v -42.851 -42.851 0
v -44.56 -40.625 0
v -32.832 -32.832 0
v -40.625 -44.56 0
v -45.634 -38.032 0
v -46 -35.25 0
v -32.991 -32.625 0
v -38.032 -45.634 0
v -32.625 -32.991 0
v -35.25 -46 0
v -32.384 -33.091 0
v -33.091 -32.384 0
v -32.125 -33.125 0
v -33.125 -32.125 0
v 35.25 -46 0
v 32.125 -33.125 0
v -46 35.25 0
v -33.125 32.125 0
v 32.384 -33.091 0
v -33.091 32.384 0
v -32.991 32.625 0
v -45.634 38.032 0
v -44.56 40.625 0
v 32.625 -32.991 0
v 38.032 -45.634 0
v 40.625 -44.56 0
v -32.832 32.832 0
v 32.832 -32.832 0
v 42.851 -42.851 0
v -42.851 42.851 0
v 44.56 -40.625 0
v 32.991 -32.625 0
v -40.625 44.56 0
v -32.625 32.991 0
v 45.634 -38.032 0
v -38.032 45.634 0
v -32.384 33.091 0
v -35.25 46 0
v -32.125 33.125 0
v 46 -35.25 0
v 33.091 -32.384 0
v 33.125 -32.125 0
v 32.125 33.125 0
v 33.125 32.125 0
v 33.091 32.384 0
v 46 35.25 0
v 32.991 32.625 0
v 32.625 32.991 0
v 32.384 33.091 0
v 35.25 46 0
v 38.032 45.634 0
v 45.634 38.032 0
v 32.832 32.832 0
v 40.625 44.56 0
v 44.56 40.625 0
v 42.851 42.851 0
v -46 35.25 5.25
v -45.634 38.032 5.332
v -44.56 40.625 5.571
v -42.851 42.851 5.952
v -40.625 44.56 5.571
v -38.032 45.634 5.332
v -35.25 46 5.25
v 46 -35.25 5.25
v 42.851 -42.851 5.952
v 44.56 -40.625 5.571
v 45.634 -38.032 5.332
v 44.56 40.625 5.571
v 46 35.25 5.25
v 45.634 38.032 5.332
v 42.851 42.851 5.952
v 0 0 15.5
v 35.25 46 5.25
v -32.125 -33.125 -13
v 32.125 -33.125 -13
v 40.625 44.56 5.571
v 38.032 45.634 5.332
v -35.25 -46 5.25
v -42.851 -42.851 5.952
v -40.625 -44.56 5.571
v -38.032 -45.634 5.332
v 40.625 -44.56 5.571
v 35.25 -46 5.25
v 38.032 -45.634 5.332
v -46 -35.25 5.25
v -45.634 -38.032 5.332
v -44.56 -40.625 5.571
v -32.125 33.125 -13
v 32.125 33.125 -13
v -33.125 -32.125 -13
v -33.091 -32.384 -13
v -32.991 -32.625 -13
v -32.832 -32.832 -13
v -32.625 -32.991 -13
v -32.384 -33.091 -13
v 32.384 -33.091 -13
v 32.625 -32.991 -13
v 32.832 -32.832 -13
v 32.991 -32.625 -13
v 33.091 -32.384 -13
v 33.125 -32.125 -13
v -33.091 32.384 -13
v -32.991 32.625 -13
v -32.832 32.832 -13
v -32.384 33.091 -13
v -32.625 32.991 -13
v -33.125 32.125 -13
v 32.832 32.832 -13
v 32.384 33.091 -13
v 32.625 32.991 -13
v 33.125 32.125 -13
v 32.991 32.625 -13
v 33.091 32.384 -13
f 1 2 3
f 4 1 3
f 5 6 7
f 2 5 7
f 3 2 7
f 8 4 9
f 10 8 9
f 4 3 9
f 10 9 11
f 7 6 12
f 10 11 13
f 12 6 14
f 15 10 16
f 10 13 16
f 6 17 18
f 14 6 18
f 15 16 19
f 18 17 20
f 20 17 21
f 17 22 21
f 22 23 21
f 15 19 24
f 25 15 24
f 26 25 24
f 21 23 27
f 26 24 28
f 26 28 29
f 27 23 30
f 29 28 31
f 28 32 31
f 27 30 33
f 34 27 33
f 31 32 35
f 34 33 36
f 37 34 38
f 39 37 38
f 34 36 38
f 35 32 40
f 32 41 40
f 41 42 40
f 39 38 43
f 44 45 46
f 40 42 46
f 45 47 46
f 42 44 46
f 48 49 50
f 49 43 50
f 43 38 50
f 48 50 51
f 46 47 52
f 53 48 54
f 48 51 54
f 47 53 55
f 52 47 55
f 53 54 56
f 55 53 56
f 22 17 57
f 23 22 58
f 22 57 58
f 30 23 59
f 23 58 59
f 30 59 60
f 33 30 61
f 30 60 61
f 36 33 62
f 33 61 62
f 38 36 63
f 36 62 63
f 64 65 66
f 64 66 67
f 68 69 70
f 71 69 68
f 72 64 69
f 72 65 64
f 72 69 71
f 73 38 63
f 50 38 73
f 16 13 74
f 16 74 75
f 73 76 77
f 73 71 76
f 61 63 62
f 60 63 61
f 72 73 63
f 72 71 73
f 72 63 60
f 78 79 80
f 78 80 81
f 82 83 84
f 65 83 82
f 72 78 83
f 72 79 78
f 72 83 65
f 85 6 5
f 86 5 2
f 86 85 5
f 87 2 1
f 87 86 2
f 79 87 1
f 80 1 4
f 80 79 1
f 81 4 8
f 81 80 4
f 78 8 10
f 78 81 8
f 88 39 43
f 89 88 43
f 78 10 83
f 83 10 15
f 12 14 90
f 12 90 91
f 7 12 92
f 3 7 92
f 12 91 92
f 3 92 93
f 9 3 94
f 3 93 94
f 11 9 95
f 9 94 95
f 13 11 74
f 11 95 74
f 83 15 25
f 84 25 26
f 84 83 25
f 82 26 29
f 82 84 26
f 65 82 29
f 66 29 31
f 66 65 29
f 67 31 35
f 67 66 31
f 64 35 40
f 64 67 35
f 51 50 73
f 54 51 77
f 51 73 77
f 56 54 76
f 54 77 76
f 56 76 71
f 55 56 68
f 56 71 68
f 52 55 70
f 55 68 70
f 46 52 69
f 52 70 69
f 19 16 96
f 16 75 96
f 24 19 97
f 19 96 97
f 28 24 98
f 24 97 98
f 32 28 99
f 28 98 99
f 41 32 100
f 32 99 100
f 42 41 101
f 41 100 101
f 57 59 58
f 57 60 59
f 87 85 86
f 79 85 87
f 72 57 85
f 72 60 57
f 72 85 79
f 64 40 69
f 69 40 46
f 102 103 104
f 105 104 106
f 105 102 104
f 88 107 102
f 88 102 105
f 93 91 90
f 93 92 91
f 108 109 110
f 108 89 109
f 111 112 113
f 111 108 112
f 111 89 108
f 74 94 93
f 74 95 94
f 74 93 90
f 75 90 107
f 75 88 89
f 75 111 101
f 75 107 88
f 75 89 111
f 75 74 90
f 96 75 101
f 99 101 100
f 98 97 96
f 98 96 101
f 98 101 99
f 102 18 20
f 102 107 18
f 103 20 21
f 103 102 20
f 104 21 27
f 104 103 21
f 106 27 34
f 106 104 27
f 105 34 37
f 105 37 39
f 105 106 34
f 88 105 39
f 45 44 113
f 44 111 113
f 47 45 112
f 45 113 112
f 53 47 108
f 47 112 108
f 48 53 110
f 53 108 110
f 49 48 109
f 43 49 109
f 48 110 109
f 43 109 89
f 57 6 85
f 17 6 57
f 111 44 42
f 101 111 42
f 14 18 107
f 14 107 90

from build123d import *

# Parameters (mm, degrees)
F0_W      = 92
F0_H      = 92
F1_DEPTH  = 5.25
F1_FACE_W = 92
F1_FACE_H = 92
F5_R      = 10.75
F6_W      = 66.25
F6_H      = 66.25
F7_DEPTH  = 13
F8_R      = 1


with BuildPart() as f1:
    # F0 (on Top) → F1 (new body)
    with BuildSketch(Plane.XY):
        Rectangle(F0_W, F0_H)
    extrude(amount=F1_DEPTH)

    # F1_face (on face) → F4 section 0
    with BuildSketch(Plane.XY.offset(5.25), mode=Mode.PRIVATE) as f4_s0:
        Rectangle(F1_FACE_W, F1_FACE_H)
    loft([f4_s0.sketch, Vertex(0, 0, 15.5)])

    # F5
    f5_edges = [f1.edges().sort_by_distance(p)[0] for p in [
        (-46, -46, 2.625),
        (46, -46, 2.625),
        (46, 46, 2.625),
        (-46, 46, 2.625),
    ]]
    fillet(f5_edges, radius=F5_R)

    # F6 (on face) → F7 (join)
    with BuildSketch(Plane(origin=(0, 0, 0), x_dir=(1, 0, 0), z_dir=(0, 0, -1))):
        Rectangle(F6_W, F6_H)
    extrude(amount=F7_DEPTH)

    # F8
    f8_edges = [f1.edges().sort_by_distance(p)[0] for p in [
        (33.125, 33.125, -6.5),
        (-33.125, 33.125, -6.5),
        (-33.125, -33.125, -6.5),
        (33.125, -33.125, -6.5),
    ]]
    fillet(f8_edges, radius=F8_R)


solid = f1.part
